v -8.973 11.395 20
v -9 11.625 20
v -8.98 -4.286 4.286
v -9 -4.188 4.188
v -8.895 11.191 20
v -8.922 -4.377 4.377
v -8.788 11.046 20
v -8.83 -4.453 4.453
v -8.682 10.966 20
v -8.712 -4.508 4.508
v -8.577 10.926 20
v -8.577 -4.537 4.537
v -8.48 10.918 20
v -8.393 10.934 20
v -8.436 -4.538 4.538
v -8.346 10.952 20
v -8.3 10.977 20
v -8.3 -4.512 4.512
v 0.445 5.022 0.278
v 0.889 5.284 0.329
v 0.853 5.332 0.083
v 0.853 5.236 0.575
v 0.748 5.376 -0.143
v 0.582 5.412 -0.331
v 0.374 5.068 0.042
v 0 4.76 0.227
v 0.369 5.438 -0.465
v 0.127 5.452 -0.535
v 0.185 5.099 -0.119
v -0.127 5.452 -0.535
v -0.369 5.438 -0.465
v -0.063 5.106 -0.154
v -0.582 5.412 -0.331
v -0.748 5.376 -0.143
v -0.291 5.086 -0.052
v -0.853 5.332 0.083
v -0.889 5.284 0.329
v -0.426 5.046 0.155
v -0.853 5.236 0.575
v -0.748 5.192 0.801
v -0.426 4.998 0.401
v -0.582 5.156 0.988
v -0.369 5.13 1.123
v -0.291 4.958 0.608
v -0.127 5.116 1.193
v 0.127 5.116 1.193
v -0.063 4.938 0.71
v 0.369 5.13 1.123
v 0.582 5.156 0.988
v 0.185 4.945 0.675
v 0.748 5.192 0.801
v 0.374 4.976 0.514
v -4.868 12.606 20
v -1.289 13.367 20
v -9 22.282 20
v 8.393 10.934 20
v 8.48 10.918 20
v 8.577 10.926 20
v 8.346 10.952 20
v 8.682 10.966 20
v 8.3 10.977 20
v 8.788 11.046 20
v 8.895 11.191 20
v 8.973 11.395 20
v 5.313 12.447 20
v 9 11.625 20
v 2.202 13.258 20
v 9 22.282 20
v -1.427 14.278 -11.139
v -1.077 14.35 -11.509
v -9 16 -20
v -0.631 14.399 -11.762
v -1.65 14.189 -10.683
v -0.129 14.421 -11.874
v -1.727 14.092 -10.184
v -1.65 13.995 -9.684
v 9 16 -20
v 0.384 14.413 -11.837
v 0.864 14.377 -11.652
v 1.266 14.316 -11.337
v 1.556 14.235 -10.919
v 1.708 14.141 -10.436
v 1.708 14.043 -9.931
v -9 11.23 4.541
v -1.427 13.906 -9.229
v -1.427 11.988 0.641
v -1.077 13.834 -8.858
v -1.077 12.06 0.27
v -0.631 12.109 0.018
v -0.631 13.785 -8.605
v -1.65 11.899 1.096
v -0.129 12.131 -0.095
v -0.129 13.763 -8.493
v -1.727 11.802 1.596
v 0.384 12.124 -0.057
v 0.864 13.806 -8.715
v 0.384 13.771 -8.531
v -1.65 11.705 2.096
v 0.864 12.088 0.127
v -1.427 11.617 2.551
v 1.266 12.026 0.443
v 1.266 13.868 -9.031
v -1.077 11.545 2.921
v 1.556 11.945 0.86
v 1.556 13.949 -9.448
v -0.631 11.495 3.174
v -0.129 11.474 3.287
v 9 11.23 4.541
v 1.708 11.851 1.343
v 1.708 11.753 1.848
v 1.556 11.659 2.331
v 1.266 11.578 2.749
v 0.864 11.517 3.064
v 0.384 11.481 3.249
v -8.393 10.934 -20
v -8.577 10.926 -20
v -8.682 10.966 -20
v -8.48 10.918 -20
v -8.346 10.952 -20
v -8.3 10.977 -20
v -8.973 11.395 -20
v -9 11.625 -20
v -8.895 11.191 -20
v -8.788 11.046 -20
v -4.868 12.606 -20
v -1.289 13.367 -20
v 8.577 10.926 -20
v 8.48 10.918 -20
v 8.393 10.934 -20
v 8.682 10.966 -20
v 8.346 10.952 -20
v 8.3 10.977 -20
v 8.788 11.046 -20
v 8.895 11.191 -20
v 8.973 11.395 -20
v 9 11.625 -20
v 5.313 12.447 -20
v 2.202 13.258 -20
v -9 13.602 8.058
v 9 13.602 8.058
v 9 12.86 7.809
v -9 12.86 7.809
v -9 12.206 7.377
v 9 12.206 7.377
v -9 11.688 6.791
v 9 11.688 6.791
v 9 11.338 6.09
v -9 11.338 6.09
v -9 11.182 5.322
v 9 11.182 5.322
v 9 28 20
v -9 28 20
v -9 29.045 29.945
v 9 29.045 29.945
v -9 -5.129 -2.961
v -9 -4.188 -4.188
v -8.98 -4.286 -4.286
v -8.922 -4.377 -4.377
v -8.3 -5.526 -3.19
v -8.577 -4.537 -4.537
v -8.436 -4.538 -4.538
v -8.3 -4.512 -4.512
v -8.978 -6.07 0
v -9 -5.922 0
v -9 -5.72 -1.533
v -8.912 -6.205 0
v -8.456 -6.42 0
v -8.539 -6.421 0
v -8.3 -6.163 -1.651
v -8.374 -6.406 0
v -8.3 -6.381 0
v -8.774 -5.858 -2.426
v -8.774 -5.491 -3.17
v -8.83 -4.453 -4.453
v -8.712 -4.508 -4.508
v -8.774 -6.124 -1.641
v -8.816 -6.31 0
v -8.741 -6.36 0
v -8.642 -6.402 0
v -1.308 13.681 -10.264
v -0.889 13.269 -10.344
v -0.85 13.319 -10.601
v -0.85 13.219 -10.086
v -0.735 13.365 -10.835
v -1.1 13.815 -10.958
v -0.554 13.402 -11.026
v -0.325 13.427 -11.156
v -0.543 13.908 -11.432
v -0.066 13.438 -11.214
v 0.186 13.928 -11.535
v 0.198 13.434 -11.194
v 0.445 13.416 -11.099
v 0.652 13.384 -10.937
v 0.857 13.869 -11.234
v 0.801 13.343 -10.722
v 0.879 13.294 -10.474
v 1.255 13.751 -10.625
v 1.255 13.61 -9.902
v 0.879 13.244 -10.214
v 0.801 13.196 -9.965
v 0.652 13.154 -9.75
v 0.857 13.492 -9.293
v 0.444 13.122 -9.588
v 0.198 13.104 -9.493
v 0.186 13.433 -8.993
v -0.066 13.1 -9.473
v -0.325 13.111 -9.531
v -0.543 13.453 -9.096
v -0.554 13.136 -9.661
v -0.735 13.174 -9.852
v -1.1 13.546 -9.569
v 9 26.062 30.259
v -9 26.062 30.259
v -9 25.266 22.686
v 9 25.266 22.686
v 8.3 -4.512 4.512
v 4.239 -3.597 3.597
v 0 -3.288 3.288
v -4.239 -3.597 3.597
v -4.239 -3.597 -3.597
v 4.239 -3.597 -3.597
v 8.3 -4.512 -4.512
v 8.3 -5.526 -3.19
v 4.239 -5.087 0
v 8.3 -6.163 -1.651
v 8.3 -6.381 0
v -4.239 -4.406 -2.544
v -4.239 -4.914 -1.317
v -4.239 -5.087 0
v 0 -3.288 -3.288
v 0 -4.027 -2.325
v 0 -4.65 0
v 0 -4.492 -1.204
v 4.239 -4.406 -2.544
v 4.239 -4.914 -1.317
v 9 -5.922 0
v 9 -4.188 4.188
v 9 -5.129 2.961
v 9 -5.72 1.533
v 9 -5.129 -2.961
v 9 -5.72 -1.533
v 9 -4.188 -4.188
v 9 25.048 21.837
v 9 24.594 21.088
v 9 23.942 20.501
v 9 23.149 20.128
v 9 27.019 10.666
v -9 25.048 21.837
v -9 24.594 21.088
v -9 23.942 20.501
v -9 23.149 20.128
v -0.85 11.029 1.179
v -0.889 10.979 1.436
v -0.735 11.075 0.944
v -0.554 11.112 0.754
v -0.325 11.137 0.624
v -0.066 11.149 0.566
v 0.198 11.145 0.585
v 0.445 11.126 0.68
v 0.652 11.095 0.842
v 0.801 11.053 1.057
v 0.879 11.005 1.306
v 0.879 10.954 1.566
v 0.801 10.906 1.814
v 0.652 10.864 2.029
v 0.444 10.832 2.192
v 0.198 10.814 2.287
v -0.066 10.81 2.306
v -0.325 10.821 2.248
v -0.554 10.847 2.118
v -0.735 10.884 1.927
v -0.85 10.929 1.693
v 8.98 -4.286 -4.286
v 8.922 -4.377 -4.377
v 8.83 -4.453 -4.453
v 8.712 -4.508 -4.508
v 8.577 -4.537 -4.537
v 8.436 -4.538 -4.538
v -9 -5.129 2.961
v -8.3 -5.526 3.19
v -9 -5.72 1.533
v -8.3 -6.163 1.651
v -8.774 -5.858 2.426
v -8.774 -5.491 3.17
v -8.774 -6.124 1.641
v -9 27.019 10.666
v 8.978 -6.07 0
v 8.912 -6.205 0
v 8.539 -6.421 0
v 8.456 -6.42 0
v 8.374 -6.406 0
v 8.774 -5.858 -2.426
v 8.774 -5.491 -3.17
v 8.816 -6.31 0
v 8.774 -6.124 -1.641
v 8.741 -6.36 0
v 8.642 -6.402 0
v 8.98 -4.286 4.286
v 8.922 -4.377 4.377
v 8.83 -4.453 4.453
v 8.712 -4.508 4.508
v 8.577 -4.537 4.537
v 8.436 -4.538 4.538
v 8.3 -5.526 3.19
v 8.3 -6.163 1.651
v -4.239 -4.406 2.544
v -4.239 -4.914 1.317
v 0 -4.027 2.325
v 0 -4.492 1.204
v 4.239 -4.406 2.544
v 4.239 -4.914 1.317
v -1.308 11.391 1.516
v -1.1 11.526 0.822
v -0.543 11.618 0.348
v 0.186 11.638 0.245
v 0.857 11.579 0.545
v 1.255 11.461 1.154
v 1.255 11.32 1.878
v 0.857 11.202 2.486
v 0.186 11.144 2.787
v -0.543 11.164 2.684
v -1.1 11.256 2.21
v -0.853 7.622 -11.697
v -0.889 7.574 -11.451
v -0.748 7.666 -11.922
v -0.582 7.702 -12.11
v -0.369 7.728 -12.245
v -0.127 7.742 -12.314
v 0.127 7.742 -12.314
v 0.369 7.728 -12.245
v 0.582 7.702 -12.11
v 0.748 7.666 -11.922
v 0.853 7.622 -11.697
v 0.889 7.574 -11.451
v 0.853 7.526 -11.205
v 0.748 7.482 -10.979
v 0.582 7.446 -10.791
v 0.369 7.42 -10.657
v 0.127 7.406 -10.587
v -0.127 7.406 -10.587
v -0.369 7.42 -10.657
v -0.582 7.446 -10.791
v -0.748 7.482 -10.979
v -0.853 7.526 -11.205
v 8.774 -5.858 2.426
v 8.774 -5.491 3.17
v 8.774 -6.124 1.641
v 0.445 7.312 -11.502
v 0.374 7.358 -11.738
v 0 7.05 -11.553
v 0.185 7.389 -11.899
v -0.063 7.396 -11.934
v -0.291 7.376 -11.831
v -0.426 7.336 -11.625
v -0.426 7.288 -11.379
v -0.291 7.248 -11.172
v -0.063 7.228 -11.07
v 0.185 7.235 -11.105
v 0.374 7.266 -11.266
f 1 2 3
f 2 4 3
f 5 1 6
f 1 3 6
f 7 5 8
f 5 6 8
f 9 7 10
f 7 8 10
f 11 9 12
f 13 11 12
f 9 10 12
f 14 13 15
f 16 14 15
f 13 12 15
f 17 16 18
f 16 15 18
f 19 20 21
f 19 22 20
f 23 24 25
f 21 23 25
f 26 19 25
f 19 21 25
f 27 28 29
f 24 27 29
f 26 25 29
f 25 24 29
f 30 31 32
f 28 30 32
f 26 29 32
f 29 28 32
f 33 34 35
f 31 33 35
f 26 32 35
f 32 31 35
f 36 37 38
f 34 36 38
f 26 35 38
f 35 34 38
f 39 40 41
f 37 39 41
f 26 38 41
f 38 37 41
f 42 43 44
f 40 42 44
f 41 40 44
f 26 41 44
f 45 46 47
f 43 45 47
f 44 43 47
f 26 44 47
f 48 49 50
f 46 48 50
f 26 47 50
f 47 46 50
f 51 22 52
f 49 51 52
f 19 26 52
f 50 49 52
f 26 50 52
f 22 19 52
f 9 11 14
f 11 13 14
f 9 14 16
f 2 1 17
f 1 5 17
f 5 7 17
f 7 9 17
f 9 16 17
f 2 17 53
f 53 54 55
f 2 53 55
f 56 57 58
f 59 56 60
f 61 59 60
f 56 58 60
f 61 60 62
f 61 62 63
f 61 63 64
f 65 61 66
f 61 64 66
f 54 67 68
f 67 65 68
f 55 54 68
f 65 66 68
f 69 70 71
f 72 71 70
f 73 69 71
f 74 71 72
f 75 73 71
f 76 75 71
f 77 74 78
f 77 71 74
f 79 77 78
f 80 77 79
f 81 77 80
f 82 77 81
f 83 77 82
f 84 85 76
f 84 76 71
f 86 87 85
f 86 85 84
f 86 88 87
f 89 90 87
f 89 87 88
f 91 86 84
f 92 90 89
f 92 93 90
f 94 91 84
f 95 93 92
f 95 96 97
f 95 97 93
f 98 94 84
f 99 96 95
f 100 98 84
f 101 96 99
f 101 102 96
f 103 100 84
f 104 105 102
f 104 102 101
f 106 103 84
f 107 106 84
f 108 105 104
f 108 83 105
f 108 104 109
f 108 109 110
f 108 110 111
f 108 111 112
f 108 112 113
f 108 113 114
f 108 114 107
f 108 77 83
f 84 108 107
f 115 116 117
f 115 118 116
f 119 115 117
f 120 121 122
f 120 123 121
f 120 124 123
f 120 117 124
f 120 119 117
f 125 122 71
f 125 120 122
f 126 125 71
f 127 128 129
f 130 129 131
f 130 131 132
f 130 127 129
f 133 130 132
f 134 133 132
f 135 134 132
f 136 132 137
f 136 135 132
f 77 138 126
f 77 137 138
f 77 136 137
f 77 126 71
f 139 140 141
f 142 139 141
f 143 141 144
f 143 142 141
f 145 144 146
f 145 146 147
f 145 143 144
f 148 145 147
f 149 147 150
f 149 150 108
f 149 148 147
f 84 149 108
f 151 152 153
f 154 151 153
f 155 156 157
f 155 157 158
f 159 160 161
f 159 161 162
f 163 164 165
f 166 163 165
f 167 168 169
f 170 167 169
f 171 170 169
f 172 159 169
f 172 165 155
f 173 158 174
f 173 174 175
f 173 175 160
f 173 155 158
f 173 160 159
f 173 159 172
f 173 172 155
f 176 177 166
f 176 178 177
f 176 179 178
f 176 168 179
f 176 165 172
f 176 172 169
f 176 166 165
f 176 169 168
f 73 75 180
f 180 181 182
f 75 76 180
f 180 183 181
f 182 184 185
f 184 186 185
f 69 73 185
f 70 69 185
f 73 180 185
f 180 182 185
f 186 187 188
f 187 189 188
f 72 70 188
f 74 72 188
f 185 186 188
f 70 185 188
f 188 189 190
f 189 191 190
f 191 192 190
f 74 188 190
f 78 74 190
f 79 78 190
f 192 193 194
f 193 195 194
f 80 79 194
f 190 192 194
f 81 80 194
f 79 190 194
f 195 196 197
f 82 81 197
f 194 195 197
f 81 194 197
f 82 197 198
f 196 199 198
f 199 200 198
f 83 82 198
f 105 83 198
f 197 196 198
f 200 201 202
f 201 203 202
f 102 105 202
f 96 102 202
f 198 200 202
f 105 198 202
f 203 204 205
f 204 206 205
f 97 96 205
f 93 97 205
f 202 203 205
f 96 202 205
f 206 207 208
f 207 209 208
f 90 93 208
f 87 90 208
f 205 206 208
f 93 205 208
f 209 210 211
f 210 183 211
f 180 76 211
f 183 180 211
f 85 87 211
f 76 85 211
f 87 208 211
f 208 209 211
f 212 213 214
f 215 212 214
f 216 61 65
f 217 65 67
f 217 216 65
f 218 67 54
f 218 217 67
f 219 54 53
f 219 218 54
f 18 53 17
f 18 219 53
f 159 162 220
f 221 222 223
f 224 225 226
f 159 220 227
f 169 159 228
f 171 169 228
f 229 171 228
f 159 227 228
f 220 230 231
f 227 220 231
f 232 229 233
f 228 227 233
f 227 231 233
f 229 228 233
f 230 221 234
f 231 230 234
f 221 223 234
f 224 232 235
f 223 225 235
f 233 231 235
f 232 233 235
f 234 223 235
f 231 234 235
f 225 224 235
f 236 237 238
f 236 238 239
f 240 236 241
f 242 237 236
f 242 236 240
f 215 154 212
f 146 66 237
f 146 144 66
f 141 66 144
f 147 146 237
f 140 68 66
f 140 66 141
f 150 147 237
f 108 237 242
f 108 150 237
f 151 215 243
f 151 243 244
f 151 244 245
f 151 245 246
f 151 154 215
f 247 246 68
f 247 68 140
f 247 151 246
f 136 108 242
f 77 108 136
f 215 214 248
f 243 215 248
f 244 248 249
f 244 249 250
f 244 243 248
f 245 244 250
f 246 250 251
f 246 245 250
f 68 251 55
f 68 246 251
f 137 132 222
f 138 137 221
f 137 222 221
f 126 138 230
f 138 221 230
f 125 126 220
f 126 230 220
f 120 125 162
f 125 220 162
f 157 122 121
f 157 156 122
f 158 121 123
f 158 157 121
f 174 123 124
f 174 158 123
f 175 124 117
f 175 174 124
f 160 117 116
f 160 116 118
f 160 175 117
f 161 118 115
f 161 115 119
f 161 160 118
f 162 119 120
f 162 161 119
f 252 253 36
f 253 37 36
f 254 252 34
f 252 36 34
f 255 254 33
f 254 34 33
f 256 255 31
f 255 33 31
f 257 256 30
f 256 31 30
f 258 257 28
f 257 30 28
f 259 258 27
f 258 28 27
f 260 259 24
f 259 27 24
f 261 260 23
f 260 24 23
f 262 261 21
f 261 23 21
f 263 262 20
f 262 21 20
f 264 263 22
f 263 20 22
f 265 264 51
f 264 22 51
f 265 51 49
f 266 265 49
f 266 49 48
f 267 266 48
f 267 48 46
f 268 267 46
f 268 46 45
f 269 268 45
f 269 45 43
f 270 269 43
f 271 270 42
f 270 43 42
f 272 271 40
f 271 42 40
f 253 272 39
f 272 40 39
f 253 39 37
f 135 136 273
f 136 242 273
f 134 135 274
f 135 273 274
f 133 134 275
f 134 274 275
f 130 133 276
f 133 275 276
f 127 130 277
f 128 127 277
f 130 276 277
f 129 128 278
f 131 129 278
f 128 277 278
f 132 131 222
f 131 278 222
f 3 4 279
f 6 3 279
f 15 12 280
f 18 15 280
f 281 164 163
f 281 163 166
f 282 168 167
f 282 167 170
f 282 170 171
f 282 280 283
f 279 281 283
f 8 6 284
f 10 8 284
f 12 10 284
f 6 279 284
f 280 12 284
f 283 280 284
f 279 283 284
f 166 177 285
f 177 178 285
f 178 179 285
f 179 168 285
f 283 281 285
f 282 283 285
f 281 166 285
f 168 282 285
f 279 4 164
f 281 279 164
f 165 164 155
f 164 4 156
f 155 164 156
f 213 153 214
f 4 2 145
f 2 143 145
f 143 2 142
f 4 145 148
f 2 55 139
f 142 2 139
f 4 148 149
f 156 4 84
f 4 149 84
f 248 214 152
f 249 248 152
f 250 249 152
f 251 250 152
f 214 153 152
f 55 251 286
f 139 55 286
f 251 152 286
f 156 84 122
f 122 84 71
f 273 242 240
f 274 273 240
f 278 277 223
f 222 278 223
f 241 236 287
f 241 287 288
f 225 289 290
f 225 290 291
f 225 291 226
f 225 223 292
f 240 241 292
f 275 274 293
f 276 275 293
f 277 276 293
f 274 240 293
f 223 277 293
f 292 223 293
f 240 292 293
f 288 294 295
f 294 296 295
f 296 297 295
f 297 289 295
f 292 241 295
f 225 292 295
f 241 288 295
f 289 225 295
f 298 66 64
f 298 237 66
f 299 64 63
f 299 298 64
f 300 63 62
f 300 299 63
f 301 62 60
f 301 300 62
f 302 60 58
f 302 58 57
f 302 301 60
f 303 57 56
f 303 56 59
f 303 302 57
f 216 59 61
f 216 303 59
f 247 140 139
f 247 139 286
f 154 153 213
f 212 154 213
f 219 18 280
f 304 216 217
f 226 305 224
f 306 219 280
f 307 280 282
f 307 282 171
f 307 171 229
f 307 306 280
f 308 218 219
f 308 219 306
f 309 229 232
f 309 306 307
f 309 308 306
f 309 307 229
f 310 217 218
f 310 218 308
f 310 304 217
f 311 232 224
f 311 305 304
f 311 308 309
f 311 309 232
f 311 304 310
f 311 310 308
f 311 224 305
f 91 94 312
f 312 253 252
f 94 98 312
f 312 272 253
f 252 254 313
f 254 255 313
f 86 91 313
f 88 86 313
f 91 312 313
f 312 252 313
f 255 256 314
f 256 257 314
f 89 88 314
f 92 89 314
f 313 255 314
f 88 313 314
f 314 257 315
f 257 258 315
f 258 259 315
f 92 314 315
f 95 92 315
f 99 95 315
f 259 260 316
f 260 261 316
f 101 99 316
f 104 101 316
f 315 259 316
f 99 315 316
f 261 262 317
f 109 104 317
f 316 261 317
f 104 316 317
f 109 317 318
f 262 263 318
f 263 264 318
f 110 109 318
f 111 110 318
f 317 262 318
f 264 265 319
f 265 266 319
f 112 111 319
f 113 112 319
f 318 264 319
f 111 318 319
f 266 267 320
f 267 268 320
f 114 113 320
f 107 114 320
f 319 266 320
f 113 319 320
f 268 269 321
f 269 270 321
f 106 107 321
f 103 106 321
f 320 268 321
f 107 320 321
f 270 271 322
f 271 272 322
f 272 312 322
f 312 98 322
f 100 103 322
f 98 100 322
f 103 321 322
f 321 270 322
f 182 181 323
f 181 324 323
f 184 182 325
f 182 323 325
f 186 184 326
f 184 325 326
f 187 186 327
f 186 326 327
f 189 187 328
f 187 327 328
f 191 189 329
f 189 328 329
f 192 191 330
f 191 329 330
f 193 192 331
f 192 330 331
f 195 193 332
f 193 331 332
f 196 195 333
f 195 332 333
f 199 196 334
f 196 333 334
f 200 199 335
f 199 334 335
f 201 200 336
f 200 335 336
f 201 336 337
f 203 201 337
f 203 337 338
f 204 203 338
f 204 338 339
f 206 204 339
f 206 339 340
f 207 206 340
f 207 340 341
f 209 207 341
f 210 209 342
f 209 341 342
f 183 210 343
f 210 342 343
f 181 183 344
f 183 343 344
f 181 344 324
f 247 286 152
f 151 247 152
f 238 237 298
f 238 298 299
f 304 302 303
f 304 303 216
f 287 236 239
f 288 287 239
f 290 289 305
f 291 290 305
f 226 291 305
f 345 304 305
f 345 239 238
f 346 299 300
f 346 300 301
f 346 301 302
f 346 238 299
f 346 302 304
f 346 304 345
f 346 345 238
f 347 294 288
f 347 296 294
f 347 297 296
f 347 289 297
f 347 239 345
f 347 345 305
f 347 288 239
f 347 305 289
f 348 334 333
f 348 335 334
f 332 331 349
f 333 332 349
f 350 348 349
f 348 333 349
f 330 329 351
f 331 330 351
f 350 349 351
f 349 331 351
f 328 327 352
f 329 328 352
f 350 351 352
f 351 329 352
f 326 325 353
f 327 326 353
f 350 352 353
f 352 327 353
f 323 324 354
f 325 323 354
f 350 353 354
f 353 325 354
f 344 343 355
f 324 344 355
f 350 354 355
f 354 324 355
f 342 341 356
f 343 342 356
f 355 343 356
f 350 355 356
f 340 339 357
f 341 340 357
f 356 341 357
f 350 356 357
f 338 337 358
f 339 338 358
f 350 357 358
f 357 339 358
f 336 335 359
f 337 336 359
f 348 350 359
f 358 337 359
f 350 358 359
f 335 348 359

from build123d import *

# Parameters (mm, degrees)
BOSS_EXTRUDE1_DEPTH             = 9
SKETCH4_W                       = 18
SKETCH4_H                       = 44.313566923
CUT_EXTRUDE3_DEPTH              = 6
FILLET1_R                       = 0.5
CUT_EXTRUDE4_DEPTH              = 20
F_2_56_TAPPED_HOLE1_D           = 1.778
F_2_56_TAPPED_HOLE1_DEPTH       = 6.64
F_2_56_TAPPED_HOLE1_CSINK_D     = 3.4544
F_2_56_TAPPED_HOLE1_CSINK_ANGLE = 90
F_2_56_TAPPED_HOLE1_TIP         = 0.53416509
CUT_EXTRUDE5_DEPTH              = 19.0000001
BOSS_EXTRUDE2_DEPTH             = 18
FILLET2_R                       = 3


with BuildPart() as part:
    # Sketch1 → Boss-Extrude1 (new body, symmetric)
    with BuildSketch(Plane(origin=(0, 0, 0), x_dir=(0, 0, -1), z_dir=(1, 0, 0))):
        with BuildLine():
            Line((3.00520382, -3.00520382), (20, 13.98959236))
            Line((20, 13.98959236), (20, 30))
            Line((20, 30), (0, 30))
            Line((0, 30), (0, -4.25))
            ThreePointArc((0, -4.25), (1.626404588, -3.926488013), (3.00520382, -3.00520382))
        make_face()
    extrude(amount=BOSS_EXTRUDE1_DEPTH, both=True)

    # Sweep1: sweep along a path in Sketch2
    with BuildLine(Plane(origin=(0, 0, 0), x_dir=(0, 0, -1), z_dir=(1, 0, 0))) as sweep1_path:
        Line((20, 13.98959236), (3.00520382, -3.00520382))
        ThreePointArc((3.00520382, -3.00520382), (1.626404588, -3.926488013), (0, -4.25))
    # Sketch3 → Sweep1 (sweep)
    with BuildSketch(Plane.XY):
        with BuildLine():
            Line((9, -4.25), (-9, -4.25))
            Line((-9, -4.25), (-9, -6.701215317))
            ThreePointArc((-9, -6.701215317), (0, -4.65), (9, -6.701215317))
            Line((9, -6.701215317), (9, -4.25))
        make_face()
    sweep(path=sweep1_path.line)

    # Sketch4 → Cut-Extrude3 (cut)
    with BuildSketch(Plane(origin=(0, 0, -20), x_dir=(-1, 0, 0), z_dir=(0, 0, -1))):
        with Locations((0, 7.843216539)):
            Rectangle(SKETCH4_W, SKETCH4_H)
    extrude(amount=CUT_EXTRUDE3_DEPTH, mode=Mode.SUBTRACT)

    # Fillet1
    fillet1_edges = [part.edges().sort_by_distance(p)[0] for p in [
        (9, 2.89228781, -12.369237397),
        (-9, 2.89228781, -12.369237397),
        (9, -6.191115675, -2.564444079),
        (-9, -6.191115675, -2.564444079),
    ]]
    fillet(fillet1_edges, radius=FILLET1_R)

    # Mirror1: part across plane


with BuildPart() as part_1:
    add(part.part)
    add(part.part.mirror(Plane(origin=(9, 30, 0), x_dir=(1, 0, 0), z_dir=(0, 0, -1))))

    # Sketch5 → Cut-Extrude4 (cut, symmetric)
    with BuildSketch(Plane(origin=(0, 0, 0), x_dir=(0, 0, -1), z_dir=(1, 0, 0))):
        Polygon((20, 16), (-7.485561137, 10.657348129), (-11.245391787, 30), (20, 30), align=None)
    extrude(amount=CUT_EXTRUDE4_DEPTH, both=True, mode=Mode.SUBTRACT)

    # #2-56 Tapped Hole1
    with Locations(Plane(origin=(0, 11.671404902, 2.268691293), x_dir=(1, 0, 0), z_dir=(0, 0.981627183, 0.190808995))):
        with Locations((0, 12.685487595), (0, 0.685487595)):
            CounterSinkHole(F_2_56_TAPPED_HOLE1_D / 2, F_2_56_TAPPED_HOLE1_CSINK_D / 2, depth=F_2_56_TAPPED_HOLE1_DEPTH, counter_sink_angle=F_2_56_TAPPED_HOLE1_CSINK_ANGLE)
            with Locations((0, 0, -(F_2_56_TAPPED_HOLE1_DEPTH + F_2_56_TAPPED_HOLE1_TIP / 2))):  # 118° drill point
                Cone(0, F_2_56_TAPPED_HOLE1_D / 2, F_2_56_TAPPED_HOLE1_TIP, mode=Mode.SUBTRACT)

    # Sketch8 → Cut-Extrude5 (cut, through all)
    with BuildSketch(Plane.ZY.offset(9)):
        Polygon((10.6659344, 27.018950173), (20, 28), (20, 30), (11.245391787, 30), align=None)
    extrude(amount=-CUT_EXTRUDE5_DEPTH, mode=Mode.SUBTRACT)

    # Sketch10 → Boss-Extrude2 (add)
    with BuildSketch(Plane.ZY.offset(9)):
        Polygon((20, 28), (29.945218954, 29.045284633), (30.258804343, 26.061718947), (20, 24.983475161), align=None)
    extrude(amount=-BOSS_EXTRUDE2_DEPTH)

    # Fillet2
    fillet2_edges = [part_1.edges().sort_by_distance(p)[0] for p in [
        (0, 10.657348129, 7.485561137),
        (0, 24.983475161, 20),
    ]]
    fillet(fillet2_edges, radius=FILLET2_R)


solid = part_1.part
